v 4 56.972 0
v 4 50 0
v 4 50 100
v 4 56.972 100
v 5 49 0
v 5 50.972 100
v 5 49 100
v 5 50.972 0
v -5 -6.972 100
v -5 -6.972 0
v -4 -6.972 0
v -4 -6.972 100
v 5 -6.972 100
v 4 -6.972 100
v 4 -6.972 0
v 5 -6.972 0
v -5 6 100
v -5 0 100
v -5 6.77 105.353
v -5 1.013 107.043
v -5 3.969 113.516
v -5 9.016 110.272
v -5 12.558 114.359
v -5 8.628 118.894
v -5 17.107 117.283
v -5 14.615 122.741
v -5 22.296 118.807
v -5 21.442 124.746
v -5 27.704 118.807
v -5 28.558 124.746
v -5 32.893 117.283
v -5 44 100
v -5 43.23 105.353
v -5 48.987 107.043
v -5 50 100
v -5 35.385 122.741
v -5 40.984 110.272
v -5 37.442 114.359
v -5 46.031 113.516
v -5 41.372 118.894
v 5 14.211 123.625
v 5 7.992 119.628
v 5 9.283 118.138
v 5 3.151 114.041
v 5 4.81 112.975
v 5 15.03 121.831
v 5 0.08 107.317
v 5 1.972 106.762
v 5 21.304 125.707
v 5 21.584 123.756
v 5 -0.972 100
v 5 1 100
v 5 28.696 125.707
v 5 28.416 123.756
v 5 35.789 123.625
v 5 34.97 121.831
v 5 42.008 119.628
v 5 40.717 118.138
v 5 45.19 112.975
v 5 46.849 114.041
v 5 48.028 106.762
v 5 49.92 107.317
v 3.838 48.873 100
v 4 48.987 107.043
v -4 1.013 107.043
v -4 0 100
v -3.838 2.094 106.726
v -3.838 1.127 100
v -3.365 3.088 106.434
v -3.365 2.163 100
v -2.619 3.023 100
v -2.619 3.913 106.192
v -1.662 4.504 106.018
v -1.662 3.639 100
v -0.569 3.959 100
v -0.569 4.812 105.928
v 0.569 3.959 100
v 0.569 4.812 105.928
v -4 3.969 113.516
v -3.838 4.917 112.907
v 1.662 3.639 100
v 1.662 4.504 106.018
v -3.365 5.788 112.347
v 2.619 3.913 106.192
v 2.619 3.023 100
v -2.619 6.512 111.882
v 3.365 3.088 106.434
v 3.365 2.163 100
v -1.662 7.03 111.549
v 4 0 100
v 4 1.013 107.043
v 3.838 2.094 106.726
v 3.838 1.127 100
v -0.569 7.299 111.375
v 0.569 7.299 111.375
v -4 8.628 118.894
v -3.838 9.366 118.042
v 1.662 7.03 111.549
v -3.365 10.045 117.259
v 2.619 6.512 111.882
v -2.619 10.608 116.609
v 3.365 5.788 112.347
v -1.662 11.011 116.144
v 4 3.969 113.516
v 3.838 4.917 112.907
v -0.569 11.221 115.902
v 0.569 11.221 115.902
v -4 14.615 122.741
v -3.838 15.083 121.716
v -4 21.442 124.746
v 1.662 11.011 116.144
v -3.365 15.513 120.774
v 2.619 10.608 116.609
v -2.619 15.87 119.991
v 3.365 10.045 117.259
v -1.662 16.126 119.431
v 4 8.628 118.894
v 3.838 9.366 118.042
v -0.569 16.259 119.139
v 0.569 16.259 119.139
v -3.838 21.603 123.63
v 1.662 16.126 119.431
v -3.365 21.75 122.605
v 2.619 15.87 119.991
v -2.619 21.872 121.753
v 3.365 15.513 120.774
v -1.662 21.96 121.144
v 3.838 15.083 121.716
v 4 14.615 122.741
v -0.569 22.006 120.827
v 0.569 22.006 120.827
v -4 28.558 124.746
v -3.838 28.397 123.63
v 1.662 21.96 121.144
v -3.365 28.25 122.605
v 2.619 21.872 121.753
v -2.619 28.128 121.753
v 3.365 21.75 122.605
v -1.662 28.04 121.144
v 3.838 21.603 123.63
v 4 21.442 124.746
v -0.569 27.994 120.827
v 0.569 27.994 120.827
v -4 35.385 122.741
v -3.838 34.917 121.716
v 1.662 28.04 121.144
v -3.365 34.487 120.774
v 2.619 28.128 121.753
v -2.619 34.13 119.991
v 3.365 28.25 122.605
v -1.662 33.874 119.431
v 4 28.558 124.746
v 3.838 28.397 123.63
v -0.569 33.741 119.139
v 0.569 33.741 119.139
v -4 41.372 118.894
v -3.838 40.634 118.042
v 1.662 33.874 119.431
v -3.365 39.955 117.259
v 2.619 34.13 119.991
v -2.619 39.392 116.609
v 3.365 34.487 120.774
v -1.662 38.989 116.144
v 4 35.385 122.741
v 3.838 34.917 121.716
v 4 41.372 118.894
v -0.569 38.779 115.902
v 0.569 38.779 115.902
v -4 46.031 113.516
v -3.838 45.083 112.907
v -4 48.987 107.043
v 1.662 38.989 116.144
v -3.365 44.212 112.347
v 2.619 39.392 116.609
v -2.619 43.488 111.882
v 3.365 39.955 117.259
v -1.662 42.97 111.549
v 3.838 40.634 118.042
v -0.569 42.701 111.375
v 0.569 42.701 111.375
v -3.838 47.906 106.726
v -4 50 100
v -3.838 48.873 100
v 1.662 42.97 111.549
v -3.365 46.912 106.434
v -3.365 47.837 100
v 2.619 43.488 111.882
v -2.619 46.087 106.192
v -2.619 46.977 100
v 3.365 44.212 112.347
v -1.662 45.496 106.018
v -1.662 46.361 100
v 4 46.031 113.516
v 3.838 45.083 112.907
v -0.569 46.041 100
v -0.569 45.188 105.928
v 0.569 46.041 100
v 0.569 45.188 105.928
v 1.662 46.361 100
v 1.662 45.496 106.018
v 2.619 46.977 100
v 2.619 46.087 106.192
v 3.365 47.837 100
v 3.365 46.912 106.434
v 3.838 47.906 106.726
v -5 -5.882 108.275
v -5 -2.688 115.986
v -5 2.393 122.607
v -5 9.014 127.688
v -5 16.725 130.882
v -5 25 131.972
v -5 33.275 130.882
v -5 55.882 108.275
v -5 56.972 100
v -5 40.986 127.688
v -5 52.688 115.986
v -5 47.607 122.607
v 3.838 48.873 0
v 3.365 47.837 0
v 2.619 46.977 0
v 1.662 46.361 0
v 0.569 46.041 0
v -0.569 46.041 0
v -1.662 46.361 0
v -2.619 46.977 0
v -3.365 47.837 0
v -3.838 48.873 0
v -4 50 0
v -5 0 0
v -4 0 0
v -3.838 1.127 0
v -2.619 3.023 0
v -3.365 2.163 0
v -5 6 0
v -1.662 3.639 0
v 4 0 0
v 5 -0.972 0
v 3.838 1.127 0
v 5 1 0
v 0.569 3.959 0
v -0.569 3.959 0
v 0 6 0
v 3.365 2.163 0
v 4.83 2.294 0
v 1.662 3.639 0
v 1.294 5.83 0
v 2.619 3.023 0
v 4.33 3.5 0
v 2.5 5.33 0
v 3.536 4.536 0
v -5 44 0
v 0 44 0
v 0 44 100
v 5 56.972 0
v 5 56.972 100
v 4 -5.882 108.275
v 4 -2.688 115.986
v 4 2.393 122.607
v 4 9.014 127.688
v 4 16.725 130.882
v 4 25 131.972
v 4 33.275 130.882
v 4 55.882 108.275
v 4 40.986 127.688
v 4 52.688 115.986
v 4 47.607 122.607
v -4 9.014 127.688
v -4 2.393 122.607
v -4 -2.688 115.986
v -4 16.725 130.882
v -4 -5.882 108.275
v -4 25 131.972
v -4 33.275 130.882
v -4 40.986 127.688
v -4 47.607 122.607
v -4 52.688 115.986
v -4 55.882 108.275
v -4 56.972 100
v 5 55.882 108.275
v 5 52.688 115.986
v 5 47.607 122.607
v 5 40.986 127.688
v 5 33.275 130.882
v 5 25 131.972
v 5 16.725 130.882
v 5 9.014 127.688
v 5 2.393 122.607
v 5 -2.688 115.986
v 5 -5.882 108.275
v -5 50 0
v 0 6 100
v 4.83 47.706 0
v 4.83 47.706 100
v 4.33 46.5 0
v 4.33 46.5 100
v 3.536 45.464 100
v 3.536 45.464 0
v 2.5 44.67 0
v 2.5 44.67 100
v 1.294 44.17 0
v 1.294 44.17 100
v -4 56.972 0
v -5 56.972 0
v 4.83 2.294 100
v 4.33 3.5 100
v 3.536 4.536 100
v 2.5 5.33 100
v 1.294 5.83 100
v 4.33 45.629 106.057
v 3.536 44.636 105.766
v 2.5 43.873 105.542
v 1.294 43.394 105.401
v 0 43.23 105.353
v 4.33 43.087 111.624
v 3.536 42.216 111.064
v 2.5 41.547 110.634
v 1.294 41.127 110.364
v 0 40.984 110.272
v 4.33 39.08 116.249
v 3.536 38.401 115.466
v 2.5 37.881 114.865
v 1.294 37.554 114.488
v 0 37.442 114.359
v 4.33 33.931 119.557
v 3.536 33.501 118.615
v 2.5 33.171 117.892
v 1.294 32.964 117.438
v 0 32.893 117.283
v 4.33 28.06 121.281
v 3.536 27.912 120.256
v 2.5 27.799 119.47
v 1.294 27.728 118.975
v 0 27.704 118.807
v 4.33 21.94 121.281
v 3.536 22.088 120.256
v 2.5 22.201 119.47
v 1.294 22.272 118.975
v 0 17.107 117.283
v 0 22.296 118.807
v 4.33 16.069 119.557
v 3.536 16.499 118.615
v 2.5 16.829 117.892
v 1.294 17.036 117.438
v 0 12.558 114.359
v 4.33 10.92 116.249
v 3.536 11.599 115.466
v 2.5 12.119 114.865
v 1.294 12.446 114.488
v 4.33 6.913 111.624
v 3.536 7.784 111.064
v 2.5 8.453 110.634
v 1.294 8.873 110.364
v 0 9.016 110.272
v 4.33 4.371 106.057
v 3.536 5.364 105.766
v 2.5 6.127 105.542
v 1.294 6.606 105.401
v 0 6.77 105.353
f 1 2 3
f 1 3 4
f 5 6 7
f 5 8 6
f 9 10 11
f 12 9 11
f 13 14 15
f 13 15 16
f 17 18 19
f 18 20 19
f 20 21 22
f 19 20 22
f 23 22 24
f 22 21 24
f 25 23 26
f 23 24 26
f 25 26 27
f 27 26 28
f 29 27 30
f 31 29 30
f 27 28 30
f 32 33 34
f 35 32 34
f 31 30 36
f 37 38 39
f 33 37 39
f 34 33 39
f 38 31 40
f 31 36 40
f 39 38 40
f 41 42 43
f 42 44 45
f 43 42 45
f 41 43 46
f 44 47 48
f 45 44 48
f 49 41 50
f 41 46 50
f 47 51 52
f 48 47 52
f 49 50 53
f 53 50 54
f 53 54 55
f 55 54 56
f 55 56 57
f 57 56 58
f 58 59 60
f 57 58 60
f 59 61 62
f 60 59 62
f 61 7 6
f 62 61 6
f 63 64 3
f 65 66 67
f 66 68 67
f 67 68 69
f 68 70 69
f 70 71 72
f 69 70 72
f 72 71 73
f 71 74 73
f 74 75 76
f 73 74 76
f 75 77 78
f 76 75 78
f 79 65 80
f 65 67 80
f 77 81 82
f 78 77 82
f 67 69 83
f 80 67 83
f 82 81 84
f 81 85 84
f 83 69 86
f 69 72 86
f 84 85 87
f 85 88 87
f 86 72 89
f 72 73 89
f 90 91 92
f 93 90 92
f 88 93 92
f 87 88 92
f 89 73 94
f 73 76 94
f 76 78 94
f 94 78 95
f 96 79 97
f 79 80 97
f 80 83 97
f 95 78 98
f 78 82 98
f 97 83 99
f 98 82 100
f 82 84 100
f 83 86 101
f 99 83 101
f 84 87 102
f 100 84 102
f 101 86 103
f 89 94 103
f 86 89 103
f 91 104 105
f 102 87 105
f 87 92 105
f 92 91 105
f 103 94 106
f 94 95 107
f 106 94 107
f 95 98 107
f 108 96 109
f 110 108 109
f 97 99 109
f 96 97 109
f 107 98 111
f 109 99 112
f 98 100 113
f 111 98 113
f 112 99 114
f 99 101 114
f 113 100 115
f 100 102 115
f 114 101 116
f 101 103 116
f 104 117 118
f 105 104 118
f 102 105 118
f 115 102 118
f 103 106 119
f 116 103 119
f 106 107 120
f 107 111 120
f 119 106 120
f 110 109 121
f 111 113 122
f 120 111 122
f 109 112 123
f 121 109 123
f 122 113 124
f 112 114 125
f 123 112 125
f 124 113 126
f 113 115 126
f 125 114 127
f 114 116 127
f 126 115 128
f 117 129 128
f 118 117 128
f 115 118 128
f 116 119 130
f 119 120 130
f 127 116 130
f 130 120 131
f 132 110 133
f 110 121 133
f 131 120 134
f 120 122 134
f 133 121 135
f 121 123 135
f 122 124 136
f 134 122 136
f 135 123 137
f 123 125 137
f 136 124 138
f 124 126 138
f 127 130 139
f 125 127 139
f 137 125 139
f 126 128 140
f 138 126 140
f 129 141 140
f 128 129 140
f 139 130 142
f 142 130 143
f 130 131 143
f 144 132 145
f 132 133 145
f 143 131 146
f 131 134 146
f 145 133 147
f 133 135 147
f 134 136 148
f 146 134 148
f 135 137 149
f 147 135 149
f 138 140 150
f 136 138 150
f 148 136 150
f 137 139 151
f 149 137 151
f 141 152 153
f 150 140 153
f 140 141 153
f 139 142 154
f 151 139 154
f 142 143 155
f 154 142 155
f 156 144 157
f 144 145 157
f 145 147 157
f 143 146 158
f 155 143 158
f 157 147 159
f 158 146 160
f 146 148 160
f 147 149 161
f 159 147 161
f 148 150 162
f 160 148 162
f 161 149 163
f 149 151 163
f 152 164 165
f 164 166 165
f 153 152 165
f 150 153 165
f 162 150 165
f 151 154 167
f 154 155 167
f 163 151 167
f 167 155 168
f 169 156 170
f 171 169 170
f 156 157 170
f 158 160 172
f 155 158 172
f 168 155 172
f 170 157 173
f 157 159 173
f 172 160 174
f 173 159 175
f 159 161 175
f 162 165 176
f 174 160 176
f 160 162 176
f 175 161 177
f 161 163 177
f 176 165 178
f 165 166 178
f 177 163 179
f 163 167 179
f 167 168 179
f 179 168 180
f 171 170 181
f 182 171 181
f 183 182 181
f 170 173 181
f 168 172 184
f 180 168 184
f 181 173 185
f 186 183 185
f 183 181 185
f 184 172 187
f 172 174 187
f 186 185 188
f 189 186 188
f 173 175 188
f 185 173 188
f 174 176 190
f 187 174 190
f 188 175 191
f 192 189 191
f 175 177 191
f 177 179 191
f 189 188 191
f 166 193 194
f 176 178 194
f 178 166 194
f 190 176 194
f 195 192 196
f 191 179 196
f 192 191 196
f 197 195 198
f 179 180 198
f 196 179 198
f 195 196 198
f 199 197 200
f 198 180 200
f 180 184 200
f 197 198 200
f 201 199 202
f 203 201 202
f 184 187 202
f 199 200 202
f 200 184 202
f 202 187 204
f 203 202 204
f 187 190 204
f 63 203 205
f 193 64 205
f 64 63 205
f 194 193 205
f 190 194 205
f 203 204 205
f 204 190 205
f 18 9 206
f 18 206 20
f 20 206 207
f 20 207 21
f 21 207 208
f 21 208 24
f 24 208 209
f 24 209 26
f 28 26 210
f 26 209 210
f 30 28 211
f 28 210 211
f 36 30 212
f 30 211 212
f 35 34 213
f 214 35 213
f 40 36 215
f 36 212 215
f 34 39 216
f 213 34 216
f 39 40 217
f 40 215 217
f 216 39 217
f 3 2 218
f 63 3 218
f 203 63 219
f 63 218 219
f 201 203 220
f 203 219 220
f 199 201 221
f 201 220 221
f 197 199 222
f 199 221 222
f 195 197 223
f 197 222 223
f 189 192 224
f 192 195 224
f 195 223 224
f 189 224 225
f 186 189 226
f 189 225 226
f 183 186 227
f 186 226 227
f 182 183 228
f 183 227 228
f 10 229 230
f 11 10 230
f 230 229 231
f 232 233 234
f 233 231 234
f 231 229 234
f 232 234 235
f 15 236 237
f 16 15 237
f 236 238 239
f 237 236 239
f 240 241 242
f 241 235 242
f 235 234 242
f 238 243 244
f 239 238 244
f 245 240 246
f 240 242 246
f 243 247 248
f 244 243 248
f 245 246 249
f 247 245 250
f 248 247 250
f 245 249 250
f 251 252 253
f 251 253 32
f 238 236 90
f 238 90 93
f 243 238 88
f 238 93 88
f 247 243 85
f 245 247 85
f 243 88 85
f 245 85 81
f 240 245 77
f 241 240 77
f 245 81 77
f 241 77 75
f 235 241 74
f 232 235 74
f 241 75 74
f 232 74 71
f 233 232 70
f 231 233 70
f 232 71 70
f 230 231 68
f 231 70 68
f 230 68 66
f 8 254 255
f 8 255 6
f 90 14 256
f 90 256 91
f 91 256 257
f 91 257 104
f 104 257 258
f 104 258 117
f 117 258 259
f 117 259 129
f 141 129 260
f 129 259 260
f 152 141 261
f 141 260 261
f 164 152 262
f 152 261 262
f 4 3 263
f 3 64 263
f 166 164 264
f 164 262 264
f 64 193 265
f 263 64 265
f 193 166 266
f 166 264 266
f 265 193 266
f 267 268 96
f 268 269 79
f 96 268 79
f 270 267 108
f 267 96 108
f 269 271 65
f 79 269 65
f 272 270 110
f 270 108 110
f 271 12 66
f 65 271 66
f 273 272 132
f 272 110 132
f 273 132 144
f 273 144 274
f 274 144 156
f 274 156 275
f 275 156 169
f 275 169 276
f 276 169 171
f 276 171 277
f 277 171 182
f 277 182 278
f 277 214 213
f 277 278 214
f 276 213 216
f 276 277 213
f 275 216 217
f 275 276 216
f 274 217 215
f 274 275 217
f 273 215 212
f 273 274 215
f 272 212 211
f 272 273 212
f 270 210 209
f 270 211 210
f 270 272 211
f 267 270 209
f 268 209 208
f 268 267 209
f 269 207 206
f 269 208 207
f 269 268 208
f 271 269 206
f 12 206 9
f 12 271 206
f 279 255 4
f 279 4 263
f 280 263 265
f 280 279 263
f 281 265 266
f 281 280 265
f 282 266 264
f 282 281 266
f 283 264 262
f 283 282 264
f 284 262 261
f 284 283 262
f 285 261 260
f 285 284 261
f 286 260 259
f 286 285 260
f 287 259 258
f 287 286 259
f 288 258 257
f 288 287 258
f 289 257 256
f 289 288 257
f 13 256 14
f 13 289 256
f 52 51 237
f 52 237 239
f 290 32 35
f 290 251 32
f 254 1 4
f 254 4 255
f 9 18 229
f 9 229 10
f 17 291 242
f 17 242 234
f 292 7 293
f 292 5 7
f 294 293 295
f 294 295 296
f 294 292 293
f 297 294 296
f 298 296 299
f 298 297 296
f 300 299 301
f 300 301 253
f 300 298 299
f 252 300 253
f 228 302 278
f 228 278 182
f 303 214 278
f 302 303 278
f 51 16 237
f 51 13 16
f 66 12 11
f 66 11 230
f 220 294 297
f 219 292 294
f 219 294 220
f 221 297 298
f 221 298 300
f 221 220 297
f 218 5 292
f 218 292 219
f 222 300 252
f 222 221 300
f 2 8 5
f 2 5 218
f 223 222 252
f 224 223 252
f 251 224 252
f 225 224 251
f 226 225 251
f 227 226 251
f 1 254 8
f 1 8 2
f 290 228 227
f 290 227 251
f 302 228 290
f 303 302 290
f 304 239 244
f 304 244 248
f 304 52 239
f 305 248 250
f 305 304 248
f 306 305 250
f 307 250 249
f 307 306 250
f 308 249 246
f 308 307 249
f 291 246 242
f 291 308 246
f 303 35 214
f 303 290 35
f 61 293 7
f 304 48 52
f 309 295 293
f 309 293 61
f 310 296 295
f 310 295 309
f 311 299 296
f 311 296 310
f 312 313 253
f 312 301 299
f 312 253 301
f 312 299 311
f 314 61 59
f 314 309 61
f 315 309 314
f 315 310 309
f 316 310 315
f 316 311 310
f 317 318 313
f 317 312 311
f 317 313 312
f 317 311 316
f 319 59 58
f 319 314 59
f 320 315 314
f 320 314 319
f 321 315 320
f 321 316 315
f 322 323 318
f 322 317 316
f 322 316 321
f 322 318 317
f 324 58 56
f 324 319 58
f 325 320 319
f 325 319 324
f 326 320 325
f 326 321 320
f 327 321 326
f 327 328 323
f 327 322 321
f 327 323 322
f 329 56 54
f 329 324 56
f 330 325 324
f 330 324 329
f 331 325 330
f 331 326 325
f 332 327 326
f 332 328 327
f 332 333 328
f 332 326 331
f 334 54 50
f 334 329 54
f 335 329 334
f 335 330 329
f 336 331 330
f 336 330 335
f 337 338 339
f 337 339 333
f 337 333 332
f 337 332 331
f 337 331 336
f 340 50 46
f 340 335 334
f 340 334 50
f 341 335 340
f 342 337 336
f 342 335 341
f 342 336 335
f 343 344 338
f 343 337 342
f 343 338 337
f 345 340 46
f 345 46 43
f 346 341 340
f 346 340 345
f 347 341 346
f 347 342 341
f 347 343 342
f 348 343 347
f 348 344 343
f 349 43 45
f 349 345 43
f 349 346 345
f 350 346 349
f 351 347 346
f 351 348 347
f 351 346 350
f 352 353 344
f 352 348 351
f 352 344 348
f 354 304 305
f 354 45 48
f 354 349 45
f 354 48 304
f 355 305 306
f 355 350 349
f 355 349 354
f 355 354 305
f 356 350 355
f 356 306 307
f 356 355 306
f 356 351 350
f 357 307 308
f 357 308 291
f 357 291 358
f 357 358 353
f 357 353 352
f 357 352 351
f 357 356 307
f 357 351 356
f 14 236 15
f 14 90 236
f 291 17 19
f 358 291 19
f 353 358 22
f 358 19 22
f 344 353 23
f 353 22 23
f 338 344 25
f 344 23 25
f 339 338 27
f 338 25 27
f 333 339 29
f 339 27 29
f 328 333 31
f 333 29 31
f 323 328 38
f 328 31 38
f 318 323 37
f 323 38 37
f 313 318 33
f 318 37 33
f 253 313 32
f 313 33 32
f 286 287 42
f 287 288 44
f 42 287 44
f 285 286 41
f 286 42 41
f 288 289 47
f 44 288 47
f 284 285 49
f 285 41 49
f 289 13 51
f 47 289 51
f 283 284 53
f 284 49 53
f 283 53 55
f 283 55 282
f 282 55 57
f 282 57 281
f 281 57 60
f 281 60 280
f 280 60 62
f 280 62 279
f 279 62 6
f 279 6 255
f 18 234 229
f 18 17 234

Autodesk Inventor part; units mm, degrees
ref_plane "YZ Plane" through (0, 0, 0) normal (1, 0, 0) x (0, 1, 0)
ref_plane "XZ Plane" through (0, 0, 0) normal (0, 1, 0) x (-1, 0, 0)
ref_plane "XY Plane" through (0, 0, 0) normal (0, 0, 1) x (1, 0, 0)
sketch "Sketch3" plane through (0, 0, 0) normal (0, 0, 1) x (1, 0, 0)
  arc A0 (4, 0) -> (-4, 0) centre (0, 0) ccw
  line L0 (5, -0.9717) -> (5, -6.9717)
  line L1 (-5, -6.9717) -> (-5, 0)
  line L2 (-4, 0) -> (-4, -6.9717)
  line L3 (4, 0) -> (4, -6.9717)
  line L4 (5, -6.9717) -> (4, -6.9717)
  line L5 (-4, -6.9717) -> (-5, -6.9717)
  line L6 (-5, 0) -> (-5, 6)
  line L7 (-5, 6) -> (5, 6)
  line L8 (5, 6) -> (5, -0.9717)
  dimension "d9" = 8
  dimension "d11" = 6
  dimension "d29" = 10
  dimension "d30" = 6
sketch "Sketch17" plane through (0, 0, 0) normal (1, 0, 0) x (0, 1, 0)
  line L0 (0, 0) -> (0, 100)
  line L1 (50, 100) -> (50, 0)
  arc A0 (50, 100) -> (0, 100) centre (25, 100) ccw
  dimension "d49" = 100
  dimension "d50" = 50
  dimension "d51" = 50
sweep "Sweep1" add profiles "Sketch3" path "Sketch17"
fillet "Fillet6" radius 5 3 edges at (5, 6, 50) (5, 25, 119) (5, 44, 50)
properties part number "Filament Guide"
